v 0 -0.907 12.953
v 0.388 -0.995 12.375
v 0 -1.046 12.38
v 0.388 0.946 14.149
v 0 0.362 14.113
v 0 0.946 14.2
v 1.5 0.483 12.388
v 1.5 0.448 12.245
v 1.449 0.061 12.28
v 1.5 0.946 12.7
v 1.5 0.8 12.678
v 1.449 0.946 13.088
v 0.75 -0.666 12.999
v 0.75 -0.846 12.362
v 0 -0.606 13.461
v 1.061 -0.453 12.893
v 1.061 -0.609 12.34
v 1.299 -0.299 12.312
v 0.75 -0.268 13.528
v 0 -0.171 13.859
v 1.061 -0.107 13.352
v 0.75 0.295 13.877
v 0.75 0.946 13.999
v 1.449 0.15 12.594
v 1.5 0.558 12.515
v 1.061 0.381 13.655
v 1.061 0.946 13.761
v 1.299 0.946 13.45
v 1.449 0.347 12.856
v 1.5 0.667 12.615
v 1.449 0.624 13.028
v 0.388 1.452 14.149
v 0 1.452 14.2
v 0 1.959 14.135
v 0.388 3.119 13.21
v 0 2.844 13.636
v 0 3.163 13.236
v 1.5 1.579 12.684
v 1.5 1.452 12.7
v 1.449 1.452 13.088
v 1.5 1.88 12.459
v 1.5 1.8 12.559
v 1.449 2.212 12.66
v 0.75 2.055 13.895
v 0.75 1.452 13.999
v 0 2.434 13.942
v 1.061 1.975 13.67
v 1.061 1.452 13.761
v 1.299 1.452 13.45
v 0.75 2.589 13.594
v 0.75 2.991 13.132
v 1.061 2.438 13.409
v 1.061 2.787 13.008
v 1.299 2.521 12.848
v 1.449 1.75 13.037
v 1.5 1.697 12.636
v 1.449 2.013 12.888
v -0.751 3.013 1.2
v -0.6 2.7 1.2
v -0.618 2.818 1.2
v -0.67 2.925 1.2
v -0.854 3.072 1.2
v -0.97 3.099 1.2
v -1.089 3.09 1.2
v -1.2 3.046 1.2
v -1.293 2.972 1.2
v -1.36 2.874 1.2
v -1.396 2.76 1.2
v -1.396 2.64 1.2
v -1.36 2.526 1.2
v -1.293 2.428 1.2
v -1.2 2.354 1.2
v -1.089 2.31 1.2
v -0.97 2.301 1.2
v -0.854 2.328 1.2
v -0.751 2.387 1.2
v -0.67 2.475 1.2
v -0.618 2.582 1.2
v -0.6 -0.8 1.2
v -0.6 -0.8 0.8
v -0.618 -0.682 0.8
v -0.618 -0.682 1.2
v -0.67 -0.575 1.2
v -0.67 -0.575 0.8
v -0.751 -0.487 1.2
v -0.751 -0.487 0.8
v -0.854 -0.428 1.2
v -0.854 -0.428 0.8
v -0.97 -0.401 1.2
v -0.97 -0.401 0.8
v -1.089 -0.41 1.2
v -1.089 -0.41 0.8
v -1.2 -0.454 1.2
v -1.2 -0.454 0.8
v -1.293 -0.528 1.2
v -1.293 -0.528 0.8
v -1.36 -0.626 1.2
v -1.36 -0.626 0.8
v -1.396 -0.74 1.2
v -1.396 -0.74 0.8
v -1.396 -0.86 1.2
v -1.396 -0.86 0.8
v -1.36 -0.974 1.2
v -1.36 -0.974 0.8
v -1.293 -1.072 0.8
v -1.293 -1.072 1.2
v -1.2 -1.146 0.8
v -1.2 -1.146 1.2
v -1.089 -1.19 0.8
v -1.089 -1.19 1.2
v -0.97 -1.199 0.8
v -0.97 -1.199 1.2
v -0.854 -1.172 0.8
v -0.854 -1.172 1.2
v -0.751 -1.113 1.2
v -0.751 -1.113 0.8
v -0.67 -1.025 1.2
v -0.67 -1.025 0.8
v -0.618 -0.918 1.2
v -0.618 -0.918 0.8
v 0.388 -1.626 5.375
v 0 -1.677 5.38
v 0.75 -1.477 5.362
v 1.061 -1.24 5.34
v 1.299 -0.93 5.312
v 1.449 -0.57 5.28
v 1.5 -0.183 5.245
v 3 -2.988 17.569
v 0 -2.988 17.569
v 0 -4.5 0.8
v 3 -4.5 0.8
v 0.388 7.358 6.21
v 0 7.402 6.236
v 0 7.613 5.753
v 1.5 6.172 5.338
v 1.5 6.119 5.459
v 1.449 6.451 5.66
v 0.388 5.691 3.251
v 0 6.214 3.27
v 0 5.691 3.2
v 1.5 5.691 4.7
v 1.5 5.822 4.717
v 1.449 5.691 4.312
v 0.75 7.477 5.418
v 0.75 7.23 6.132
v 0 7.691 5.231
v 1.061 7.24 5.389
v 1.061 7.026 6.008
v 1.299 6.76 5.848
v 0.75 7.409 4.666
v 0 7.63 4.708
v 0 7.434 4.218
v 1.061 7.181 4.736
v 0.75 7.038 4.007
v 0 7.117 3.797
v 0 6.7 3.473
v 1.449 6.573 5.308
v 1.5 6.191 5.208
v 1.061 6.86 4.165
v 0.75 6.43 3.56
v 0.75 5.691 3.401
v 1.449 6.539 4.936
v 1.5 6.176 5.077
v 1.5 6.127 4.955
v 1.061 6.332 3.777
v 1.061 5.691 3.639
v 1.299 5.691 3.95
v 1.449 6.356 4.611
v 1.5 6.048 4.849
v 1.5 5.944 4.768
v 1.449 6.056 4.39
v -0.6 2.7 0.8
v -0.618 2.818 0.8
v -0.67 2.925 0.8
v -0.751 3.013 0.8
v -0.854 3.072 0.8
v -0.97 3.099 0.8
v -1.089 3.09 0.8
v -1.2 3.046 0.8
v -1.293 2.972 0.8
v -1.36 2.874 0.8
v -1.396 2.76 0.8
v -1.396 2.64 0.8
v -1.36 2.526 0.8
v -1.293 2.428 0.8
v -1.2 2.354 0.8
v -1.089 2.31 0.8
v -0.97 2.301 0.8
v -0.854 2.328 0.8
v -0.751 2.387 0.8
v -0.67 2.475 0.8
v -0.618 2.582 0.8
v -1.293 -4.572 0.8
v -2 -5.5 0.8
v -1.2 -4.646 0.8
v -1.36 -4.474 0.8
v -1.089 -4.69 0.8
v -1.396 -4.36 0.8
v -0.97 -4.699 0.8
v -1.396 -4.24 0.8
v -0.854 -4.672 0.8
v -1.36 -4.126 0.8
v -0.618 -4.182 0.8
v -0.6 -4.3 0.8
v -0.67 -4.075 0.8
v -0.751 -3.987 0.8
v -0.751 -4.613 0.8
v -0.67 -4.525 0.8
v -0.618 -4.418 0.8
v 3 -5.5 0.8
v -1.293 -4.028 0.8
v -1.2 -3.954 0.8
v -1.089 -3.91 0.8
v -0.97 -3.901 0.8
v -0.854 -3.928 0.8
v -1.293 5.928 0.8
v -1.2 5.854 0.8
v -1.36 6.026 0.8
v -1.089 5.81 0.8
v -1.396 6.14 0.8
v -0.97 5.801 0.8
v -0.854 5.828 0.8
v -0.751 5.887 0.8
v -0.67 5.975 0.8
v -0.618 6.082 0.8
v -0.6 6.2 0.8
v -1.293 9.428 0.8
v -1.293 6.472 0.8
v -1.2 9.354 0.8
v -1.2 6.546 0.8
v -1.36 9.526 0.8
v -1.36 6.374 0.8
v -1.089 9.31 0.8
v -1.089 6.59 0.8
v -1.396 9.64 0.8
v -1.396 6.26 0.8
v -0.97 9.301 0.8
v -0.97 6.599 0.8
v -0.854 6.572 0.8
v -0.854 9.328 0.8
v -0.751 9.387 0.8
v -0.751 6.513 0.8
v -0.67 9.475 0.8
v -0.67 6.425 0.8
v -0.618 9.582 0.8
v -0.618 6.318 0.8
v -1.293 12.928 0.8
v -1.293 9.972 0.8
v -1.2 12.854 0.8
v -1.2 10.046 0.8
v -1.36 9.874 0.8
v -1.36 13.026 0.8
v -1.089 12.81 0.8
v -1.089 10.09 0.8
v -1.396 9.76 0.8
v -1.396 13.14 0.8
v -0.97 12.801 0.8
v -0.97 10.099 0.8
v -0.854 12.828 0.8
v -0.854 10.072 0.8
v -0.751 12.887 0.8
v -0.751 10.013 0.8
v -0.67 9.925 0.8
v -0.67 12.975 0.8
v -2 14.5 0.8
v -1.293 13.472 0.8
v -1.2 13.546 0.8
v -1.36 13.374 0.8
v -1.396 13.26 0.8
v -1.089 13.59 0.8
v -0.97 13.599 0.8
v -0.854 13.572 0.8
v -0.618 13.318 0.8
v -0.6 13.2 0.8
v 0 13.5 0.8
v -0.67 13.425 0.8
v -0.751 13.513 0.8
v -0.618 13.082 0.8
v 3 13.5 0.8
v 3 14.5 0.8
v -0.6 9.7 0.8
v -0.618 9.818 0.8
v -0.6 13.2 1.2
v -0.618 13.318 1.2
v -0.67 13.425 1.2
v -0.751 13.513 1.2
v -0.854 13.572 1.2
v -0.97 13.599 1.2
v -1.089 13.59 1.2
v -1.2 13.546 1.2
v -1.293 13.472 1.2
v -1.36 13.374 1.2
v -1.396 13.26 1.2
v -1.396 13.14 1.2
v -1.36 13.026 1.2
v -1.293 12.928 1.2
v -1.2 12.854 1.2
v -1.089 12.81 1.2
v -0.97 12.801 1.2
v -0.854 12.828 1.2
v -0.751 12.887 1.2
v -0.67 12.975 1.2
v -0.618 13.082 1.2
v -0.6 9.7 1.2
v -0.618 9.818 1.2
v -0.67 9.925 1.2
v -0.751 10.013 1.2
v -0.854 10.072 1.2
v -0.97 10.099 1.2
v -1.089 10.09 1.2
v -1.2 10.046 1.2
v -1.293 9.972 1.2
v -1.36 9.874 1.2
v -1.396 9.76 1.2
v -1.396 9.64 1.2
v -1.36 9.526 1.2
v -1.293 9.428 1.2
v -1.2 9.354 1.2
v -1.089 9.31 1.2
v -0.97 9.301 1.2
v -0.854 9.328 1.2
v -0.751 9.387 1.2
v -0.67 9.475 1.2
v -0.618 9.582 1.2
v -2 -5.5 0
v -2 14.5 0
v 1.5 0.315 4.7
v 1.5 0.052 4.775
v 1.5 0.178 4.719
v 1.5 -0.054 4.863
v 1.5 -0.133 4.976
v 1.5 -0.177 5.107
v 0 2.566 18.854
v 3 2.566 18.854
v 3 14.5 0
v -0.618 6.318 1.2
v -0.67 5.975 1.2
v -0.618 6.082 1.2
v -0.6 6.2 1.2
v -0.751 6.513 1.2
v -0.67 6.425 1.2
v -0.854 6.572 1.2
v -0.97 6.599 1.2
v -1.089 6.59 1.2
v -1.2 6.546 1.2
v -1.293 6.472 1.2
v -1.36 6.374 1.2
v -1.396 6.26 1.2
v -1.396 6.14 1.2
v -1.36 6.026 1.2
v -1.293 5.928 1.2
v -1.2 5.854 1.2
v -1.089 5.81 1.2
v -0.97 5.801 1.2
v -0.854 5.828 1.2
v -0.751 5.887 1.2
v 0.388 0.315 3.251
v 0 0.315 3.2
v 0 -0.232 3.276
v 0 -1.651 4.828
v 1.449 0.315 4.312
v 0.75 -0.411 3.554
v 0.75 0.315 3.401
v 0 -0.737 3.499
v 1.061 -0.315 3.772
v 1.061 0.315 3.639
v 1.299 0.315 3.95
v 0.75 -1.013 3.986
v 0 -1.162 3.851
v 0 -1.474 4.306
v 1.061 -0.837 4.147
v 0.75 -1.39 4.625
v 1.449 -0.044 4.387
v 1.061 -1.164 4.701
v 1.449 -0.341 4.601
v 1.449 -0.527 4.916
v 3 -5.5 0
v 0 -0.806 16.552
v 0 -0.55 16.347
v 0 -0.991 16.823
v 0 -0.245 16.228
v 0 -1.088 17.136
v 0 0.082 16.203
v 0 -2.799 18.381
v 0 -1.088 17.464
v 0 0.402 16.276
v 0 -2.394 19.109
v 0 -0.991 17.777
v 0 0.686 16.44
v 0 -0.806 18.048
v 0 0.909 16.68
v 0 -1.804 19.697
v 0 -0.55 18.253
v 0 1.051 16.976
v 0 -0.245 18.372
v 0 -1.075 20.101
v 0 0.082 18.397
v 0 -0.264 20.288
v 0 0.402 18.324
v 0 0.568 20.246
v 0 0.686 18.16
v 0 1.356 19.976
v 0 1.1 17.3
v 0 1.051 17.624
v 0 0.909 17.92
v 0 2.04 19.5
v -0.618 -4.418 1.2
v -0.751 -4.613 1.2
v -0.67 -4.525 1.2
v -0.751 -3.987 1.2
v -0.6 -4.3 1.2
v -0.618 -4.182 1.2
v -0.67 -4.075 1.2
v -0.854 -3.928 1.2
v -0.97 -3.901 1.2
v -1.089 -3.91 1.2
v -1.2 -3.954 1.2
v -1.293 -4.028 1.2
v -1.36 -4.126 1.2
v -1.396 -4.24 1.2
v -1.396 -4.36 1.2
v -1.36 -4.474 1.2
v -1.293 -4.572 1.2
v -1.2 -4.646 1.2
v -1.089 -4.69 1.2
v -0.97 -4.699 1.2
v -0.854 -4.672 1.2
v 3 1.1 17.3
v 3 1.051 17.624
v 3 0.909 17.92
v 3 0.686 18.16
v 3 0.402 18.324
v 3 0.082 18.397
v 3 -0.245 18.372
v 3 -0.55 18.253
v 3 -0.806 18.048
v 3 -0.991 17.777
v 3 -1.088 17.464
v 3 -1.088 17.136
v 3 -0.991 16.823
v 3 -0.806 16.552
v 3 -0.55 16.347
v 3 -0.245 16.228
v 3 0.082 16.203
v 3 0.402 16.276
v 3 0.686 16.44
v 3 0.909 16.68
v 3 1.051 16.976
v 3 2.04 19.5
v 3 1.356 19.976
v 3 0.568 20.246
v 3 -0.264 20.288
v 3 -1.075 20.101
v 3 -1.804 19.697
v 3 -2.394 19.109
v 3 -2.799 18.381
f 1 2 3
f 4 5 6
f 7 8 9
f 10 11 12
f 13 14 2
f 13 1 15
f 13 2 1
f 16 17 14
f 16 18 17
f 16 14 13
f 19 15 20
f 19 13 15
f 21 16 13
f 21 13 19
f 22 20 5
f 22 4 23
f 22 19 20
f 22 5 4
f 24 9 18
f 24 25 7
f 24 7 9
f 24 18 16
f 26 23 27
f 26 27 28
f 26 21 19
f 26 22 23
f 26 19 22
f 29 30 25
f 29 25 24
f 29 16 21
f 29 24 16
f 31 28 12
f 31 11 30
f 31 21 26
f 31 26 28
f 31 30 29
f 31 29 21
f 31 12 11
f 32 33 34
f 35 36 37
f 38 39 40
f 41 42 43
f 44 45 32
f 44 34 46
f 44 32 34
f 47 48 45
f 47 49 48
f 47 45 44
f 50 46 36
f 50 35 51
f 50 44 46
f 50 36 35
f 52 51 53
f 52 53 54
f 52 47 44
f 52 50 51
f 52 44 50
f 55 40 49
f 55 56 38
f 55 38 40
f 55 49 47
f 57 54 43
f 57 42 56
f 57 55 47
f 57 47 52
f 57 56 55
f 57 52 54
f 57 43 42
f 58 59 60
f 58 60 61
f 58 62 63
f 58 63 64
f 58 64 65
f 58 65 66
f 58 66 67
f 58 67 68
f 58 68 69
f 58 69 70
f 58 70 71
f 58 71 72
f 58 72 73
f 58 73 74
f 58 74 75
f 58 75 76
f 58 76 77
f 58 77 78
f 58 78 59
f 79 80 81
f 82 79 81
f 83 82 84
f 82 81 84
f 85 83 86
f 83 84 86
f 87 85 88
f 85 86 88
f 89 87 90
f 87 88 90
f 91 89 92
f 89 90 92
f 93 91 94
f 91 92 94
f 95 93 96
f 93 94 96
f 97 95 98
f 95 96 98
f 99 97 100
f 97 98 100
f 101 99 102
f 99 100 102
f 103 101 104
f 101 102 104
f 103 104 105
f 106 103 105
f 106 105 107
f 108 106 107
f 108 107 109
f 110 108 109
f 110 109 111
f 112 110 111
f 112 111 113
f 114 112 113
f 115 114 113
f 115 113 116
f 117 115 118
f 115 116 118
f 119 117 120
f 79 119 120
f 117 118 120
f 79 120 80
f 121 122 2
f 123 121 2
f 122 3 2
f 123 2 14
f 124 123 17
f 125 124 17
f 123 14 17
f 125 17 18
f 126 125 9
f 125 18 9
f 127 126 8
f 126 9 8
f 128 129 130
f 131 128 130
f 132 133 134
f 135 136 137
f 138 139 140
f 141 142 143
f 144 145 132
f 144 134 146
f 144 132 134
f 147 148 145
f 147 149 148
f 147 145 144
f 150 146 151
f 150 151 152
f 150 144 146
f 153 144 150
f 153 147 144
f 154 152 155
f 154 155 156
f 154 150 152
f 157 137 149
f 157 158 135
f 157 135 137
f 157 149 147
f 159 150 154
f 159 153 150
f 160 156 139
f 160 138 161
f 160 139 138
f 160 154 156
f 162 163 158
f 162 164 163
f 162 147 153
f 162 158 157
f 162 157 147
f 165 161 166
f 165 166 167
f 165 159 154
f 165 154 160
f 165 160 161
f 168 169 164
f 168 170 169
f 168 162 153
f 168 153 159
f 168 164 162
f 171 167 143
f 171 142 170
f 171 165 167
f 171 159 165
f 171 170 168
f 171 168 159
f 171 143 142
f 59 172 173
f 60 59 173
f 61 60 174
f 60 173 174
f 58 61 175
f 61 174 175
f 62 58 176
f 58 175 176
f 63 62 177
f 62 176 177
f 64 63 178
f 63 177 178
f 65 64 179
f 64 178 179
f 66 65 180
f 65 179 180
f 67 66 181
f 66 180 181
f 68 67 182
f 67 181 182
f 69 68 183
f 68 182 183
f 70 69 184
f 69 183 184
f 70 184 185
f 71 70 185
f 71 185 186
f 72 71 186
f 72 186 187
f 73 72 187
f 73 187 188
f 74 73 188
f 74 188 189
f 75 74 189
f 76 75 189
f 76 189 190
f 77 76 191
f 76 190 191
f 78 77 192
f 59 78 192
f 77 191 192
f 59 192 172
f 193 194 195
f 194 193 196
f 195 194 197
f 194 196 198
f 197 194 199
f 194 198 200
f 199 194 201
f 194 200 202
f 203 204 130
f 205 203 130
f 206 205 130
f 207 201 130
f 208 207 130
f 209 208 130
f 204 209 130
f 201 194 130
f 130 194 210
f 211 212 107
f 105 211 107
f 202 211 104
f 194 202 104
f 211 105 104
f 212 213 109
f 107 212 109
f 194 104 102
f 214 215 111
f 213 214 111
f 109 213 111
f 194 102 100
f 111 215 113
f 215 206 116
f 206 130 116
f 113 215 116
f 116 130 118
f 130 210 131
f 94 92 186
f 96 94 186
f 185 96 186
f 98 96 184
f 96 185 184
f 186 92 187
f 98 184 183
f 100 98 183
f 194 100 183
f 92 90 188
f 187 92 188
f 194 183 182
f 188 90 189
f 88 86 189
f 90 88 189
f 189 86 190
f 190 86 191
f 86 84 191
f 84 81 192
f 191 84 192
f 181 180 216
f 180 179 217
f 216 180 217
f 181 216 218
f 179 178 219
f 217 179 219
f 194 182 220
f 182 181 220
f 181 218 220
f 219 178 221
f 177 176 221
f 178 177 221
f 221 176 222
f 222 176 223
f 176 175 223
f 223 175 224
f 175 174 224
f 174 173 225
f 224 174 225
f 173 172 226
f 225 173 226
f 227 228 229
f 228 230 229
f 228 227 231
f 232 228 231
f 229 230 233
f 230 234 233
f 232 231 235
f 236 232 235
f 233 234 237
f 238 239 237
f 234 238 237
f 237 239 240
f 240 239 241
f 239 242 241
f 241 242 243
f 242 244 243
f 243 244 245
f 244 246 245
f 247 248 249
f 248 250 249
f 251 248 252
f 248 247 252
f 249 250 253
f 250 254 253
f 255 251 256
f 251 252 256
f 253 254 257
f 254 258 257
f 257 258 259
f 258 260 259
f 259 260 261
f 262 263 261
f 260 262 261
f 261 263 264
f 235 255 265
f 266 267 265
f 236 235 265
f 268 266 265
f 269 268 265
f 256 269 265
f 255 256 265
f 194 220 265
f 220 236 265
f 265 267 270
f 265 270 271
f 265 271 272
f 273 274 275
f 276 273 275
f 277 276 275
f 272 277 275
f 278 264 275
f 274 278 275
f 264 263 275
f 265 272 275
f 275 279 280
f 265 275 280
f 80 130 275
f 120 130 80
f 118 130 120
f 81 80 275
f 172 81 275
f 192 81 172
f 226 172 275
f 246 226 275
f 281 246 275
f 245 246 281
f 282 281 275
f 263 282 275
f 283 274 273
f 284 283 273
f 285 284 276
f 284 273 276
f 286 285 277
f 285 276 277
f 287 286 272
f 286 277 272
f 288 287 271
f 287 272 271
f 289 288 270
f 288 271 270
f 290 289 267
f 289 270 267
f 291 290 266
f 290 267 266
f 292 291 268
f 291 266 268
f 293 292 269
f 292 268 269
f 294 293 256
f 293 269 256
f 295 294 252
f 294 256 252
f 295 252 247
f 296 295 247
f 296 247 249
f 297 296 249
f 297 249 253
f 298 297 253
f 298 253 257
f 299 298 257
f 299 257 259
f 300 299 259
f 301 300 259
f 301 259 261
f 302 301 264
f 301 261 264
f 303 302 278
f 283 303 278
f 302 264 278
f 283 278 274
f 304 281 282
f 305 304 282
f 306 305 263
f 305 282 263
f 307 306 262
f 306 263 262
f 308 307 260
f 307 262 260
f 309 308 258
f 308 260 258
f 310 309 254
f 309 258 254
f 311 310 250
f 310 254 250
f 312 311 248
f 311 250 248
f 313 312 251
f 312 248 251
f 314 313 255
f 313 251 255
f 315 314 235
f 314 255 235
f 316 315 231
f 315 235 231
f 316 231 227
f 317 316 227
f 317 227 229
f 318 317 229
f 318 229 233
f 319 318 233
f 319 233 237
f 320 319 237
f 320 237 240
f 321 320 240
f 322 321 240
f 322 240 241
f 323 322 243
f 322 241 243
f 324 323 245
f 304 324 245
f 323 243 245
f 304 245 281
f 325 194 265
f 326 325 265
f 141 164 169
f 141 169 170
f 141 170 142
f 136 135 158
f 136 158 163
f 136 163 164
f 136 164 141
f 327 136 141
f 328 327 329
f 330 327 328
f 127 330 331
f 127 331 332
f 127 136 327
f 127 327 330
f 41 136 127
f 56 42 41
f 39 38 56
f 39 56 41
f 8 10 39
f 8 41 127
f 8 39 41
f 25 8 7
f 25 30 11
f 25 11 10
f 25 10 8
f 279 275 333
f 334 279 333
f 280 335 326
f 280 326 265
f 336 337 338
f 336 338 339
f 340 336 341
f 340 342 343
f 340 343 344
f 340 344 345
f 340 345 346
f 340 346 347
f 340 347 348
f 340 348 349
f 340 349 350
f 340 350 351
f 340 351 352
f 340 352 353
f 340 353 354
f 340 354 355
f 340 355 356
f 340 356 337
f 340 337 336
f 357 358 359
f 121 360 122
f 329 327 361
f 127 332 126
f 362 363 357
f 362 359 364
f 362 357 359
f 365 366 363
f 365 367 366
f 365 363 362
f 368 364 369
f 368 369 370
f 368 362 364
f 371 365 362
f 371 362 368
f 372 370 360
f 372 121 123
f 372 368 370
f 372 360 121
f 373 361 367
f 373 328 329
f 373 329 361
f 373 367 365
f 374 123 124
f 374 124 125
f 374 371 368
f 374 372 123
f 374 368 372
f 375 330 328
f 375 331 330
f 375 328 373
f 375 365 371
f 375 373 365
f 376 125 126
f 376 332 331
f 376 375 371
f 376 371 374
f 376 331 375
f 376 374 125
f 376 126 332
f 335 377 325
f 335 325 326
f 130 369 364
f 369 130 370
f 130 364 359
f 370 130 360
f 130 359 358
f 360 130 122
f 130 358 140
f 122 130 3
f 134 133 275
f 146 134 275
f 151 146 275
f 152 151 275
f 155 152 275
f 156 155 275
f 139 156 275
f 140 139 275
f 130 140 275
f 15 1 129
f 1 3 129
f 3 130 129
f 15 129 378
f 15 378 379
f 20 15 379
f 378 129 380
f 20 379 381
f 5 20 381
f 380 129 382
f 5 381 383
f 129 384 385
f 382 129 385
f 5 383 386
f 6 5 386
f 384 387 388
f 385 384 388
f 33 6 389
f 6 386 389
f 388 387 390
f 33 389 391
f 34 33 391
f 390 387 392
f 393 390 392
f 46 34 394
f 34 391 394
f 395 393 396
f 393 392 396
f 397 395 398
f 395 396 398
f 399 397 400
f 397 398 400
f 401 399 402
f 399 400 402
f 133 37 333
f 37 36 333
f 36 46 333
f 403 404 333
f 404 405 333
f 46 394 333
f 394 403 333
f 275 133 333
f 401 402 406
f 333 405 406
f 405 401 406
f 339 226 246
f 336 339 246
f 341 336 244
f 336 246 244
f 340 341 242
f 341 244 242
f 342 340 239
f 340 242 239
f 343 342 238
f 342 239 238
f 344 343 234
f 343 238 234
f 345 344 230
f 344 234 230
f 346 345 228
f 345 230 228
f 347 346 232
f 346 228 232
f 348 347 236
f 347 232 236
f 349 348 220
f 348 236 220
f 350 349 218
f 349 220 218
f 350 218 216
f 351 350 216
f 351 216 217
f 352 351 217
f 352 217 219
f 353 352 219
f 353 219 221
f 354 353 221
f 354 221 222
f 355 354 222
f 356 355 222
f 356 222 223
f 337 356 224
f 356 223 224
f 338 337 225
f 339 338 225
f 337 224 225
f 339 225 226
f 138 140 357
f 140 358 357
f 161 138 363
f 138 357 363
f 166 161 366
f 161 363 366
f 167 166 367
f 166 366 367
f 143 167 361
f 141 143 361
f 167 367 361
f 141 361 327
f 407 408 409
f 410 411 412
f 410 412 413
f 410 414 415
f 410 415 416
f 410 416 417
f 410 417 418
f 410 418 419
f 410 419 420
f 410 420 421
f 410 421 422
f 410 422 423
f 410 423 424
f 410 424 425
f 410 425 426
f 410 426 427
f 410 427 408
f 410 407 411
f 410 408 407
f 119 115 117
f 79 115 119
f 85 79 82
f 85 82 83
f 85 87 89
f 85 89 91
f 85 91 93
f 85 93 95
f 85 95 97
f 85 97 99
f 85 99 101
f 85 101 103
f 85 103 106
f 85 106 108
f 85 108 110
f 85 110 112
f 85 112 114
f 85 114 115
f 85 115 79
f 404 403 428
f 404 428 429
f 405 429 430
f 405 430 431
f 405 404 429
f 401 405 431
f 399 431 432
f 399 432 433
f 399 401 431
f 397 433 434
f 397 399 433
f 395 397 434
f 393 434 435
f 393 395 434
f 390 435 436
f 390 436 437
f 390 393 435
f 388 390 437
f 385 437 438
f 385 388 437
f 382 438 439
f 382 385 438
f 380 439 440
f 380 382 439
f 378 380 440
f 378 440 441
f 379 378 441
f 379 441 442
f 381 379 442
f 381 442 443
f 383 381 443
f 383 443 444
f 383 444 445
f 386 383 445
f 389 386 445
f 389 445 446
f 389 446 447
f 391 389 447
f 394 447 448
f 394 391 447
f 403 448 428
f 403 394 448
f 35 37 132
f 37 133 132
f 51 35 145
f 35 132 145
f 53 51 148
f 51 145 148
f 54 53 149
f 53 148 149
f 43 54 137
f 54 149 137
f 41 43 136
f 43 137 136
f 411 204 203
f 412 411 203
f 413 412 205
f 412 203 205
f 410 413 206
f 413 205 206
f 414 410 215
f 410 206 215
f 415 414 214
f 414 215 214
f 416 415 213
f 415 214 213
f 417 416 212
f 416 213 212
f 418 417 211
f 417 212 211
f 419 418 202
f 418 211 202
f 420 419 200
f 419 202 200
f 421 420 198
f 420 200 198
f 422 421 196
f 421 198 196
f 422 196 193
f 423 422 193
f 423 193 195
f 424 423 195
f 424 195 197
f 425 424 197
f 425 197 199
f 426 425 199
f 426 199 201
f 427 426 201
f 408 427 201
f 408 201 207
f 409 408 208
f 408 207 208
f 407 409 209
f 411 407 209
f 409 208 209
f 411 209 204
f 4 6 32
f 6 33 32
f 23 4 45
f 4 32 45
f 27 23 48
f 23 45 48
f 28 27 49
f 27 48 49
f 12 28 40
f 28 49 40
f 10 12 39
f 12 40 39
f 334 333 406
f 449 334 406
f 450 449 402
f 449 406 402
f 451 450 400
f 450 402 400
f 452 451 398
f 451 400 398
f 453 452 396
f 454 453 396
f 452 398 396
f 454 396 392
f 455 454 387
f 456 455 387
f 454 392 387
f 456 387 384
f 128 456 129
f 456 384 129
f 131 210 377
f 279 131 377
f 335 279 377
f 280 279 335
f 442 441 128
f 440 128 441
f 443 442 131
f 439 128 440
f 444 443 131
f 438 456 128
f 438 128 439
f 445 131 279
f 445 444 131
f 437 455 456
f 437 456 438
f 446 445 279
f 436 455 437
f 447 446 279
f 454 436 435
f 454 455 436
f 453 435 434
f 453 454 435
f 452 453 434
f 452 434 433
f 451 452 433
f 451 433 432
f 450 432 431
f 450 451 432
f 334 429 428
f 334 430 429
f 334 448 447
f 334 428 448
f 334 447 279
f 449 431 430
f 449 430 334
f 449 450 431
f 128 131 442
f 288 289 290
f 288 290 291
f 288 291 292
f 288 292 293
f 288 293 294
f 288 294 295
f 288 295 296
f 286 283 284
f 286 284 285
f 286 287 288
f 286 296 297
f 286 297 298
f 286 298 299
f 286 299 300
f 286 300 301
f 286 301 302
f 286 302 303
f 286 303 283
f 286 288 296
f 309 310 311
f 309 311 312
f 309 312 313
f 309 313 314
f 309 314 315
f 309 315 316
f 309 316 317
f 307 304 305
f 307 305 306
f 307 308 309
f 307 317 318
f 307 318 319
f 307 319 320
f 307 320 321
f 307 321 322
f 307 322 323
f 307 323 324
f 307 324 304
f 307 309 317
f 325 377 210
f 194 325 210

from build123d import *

# Parameters (mm, degrees)
F0_W          = 20
F0_H          = 0.8
F1_DEPTH      = 3
F1_DEPTH_BACK = 2
F2_R          = 1.1
F3_DEPTH      = 3
F5_DEPTH      = 1.5
F6_R          = 2
F7_R          = 1.49999
F8_R          = 0.4
F9_DEPTH      = 0.4


# Not quite as in the source:
# - a fillet or chamfer is up to 0.001 mm smaller than in the source, because OpenCascade refuses the exact size


with BuildPart() as f1:
    # F0 (on Right) → F1 (new body, two sides)
    with BuildSketch(Plane.YZ) as f1_sk:
        with Locations((4.5, 0.4)):
            Rectangle(F0_W, F0_H)
    extrude(amount=F1_DEPTH)
    extrude(f1_sk.sketch, amount=-F1_DEPTH_BACK)

    # F2 (on Right) → F3 (join)
    with BuildSketch(Plane.YZ):
        with BuildLine():
            Line((-4.5, 0.8), (13.5, 0.8))
            Line((13.5, 0.8), (2.5660948526, 18.8540776067))
            ThreePointArc((2.5660948526, 18.8540776067), (-0.6760626552, 20.2228306975), (-2.9878775484, 17.5694211496))
            Line((-2.9878775484, 17.5694211496), (-4.5, 0.8))
        make_face()
        with Locations((0, 17.3)):
            Circle(F2_R, mode=Mode.SUBTRACT)
    extrude(amount=F3_DEPTH)

    # F4 (on face) → F5 (cut)
    with BuildSketch(Plane(origin=(0, 0, 0), x_dir=(0, -1, 0), z_dir=(-1, 0, 0))):
        Polygon((-9.2406928099, 3.2), (1.8738512935, 3.2), (0.8819657168, 14.2), (-2.5788760591, 14.2), align=None)
    extrude(amount=-F5_DEPTH, mode=Mode.SUBTRACT)

    # F6
    f6_edges = [f1.edges().sort_by_distance(p)[0] for p in [
        (0.75, -0.881966, 14.2),
        (0.75, 2.578876, 14.2),
        (0.75, 9.240693, 3.2),
        (0.75, -1.873851, 3.2),
    ]]
    fillet(f6_edges, radius=F6_R)

    # F7 (radius 1.5 in the source; OpenCascade refuses exactly that, so slightly less here)
    f7_edges = [f1.edges().sort_by_distance(p)[0] for p in [
        (1.5, 3.002938, 3.2),
        (1.5, 7.433697, 4.218191),
        (1.5, -1.161746, 3.850783),
        (1.5, 5.282331, 9.736052),
        (1.5, -1.361712, 8.879614),
        (1.5, 2.433741, 13.942427),
        (1.5, -0.403411, 13.676352),
        (1.5, 1.198869, 14.2),
    ]]
    fillet(f7_edges, radius=F7_R)

    # F8 (on face) → F9 (join)
    with BuildSketch(Plane.XY.offset(0.8)):
        with Locations((-1, -4.3)):
            Circle(F8_R)
        with Locations((-1, -0.8)):
            Circle(F8_R)
        with Locations((-1, 2.7)):
            Circle(F8_R)
        with Locations((-1, 6.2)):
            Circle(F8_R)
        with Locations((-1, 9.7)):
            Circle(F8_R)
        with Locations((-1, 13.2)):
            Circle(F8_R)
    extrude(amount=F9_DEPTH)


solid = f1.part
